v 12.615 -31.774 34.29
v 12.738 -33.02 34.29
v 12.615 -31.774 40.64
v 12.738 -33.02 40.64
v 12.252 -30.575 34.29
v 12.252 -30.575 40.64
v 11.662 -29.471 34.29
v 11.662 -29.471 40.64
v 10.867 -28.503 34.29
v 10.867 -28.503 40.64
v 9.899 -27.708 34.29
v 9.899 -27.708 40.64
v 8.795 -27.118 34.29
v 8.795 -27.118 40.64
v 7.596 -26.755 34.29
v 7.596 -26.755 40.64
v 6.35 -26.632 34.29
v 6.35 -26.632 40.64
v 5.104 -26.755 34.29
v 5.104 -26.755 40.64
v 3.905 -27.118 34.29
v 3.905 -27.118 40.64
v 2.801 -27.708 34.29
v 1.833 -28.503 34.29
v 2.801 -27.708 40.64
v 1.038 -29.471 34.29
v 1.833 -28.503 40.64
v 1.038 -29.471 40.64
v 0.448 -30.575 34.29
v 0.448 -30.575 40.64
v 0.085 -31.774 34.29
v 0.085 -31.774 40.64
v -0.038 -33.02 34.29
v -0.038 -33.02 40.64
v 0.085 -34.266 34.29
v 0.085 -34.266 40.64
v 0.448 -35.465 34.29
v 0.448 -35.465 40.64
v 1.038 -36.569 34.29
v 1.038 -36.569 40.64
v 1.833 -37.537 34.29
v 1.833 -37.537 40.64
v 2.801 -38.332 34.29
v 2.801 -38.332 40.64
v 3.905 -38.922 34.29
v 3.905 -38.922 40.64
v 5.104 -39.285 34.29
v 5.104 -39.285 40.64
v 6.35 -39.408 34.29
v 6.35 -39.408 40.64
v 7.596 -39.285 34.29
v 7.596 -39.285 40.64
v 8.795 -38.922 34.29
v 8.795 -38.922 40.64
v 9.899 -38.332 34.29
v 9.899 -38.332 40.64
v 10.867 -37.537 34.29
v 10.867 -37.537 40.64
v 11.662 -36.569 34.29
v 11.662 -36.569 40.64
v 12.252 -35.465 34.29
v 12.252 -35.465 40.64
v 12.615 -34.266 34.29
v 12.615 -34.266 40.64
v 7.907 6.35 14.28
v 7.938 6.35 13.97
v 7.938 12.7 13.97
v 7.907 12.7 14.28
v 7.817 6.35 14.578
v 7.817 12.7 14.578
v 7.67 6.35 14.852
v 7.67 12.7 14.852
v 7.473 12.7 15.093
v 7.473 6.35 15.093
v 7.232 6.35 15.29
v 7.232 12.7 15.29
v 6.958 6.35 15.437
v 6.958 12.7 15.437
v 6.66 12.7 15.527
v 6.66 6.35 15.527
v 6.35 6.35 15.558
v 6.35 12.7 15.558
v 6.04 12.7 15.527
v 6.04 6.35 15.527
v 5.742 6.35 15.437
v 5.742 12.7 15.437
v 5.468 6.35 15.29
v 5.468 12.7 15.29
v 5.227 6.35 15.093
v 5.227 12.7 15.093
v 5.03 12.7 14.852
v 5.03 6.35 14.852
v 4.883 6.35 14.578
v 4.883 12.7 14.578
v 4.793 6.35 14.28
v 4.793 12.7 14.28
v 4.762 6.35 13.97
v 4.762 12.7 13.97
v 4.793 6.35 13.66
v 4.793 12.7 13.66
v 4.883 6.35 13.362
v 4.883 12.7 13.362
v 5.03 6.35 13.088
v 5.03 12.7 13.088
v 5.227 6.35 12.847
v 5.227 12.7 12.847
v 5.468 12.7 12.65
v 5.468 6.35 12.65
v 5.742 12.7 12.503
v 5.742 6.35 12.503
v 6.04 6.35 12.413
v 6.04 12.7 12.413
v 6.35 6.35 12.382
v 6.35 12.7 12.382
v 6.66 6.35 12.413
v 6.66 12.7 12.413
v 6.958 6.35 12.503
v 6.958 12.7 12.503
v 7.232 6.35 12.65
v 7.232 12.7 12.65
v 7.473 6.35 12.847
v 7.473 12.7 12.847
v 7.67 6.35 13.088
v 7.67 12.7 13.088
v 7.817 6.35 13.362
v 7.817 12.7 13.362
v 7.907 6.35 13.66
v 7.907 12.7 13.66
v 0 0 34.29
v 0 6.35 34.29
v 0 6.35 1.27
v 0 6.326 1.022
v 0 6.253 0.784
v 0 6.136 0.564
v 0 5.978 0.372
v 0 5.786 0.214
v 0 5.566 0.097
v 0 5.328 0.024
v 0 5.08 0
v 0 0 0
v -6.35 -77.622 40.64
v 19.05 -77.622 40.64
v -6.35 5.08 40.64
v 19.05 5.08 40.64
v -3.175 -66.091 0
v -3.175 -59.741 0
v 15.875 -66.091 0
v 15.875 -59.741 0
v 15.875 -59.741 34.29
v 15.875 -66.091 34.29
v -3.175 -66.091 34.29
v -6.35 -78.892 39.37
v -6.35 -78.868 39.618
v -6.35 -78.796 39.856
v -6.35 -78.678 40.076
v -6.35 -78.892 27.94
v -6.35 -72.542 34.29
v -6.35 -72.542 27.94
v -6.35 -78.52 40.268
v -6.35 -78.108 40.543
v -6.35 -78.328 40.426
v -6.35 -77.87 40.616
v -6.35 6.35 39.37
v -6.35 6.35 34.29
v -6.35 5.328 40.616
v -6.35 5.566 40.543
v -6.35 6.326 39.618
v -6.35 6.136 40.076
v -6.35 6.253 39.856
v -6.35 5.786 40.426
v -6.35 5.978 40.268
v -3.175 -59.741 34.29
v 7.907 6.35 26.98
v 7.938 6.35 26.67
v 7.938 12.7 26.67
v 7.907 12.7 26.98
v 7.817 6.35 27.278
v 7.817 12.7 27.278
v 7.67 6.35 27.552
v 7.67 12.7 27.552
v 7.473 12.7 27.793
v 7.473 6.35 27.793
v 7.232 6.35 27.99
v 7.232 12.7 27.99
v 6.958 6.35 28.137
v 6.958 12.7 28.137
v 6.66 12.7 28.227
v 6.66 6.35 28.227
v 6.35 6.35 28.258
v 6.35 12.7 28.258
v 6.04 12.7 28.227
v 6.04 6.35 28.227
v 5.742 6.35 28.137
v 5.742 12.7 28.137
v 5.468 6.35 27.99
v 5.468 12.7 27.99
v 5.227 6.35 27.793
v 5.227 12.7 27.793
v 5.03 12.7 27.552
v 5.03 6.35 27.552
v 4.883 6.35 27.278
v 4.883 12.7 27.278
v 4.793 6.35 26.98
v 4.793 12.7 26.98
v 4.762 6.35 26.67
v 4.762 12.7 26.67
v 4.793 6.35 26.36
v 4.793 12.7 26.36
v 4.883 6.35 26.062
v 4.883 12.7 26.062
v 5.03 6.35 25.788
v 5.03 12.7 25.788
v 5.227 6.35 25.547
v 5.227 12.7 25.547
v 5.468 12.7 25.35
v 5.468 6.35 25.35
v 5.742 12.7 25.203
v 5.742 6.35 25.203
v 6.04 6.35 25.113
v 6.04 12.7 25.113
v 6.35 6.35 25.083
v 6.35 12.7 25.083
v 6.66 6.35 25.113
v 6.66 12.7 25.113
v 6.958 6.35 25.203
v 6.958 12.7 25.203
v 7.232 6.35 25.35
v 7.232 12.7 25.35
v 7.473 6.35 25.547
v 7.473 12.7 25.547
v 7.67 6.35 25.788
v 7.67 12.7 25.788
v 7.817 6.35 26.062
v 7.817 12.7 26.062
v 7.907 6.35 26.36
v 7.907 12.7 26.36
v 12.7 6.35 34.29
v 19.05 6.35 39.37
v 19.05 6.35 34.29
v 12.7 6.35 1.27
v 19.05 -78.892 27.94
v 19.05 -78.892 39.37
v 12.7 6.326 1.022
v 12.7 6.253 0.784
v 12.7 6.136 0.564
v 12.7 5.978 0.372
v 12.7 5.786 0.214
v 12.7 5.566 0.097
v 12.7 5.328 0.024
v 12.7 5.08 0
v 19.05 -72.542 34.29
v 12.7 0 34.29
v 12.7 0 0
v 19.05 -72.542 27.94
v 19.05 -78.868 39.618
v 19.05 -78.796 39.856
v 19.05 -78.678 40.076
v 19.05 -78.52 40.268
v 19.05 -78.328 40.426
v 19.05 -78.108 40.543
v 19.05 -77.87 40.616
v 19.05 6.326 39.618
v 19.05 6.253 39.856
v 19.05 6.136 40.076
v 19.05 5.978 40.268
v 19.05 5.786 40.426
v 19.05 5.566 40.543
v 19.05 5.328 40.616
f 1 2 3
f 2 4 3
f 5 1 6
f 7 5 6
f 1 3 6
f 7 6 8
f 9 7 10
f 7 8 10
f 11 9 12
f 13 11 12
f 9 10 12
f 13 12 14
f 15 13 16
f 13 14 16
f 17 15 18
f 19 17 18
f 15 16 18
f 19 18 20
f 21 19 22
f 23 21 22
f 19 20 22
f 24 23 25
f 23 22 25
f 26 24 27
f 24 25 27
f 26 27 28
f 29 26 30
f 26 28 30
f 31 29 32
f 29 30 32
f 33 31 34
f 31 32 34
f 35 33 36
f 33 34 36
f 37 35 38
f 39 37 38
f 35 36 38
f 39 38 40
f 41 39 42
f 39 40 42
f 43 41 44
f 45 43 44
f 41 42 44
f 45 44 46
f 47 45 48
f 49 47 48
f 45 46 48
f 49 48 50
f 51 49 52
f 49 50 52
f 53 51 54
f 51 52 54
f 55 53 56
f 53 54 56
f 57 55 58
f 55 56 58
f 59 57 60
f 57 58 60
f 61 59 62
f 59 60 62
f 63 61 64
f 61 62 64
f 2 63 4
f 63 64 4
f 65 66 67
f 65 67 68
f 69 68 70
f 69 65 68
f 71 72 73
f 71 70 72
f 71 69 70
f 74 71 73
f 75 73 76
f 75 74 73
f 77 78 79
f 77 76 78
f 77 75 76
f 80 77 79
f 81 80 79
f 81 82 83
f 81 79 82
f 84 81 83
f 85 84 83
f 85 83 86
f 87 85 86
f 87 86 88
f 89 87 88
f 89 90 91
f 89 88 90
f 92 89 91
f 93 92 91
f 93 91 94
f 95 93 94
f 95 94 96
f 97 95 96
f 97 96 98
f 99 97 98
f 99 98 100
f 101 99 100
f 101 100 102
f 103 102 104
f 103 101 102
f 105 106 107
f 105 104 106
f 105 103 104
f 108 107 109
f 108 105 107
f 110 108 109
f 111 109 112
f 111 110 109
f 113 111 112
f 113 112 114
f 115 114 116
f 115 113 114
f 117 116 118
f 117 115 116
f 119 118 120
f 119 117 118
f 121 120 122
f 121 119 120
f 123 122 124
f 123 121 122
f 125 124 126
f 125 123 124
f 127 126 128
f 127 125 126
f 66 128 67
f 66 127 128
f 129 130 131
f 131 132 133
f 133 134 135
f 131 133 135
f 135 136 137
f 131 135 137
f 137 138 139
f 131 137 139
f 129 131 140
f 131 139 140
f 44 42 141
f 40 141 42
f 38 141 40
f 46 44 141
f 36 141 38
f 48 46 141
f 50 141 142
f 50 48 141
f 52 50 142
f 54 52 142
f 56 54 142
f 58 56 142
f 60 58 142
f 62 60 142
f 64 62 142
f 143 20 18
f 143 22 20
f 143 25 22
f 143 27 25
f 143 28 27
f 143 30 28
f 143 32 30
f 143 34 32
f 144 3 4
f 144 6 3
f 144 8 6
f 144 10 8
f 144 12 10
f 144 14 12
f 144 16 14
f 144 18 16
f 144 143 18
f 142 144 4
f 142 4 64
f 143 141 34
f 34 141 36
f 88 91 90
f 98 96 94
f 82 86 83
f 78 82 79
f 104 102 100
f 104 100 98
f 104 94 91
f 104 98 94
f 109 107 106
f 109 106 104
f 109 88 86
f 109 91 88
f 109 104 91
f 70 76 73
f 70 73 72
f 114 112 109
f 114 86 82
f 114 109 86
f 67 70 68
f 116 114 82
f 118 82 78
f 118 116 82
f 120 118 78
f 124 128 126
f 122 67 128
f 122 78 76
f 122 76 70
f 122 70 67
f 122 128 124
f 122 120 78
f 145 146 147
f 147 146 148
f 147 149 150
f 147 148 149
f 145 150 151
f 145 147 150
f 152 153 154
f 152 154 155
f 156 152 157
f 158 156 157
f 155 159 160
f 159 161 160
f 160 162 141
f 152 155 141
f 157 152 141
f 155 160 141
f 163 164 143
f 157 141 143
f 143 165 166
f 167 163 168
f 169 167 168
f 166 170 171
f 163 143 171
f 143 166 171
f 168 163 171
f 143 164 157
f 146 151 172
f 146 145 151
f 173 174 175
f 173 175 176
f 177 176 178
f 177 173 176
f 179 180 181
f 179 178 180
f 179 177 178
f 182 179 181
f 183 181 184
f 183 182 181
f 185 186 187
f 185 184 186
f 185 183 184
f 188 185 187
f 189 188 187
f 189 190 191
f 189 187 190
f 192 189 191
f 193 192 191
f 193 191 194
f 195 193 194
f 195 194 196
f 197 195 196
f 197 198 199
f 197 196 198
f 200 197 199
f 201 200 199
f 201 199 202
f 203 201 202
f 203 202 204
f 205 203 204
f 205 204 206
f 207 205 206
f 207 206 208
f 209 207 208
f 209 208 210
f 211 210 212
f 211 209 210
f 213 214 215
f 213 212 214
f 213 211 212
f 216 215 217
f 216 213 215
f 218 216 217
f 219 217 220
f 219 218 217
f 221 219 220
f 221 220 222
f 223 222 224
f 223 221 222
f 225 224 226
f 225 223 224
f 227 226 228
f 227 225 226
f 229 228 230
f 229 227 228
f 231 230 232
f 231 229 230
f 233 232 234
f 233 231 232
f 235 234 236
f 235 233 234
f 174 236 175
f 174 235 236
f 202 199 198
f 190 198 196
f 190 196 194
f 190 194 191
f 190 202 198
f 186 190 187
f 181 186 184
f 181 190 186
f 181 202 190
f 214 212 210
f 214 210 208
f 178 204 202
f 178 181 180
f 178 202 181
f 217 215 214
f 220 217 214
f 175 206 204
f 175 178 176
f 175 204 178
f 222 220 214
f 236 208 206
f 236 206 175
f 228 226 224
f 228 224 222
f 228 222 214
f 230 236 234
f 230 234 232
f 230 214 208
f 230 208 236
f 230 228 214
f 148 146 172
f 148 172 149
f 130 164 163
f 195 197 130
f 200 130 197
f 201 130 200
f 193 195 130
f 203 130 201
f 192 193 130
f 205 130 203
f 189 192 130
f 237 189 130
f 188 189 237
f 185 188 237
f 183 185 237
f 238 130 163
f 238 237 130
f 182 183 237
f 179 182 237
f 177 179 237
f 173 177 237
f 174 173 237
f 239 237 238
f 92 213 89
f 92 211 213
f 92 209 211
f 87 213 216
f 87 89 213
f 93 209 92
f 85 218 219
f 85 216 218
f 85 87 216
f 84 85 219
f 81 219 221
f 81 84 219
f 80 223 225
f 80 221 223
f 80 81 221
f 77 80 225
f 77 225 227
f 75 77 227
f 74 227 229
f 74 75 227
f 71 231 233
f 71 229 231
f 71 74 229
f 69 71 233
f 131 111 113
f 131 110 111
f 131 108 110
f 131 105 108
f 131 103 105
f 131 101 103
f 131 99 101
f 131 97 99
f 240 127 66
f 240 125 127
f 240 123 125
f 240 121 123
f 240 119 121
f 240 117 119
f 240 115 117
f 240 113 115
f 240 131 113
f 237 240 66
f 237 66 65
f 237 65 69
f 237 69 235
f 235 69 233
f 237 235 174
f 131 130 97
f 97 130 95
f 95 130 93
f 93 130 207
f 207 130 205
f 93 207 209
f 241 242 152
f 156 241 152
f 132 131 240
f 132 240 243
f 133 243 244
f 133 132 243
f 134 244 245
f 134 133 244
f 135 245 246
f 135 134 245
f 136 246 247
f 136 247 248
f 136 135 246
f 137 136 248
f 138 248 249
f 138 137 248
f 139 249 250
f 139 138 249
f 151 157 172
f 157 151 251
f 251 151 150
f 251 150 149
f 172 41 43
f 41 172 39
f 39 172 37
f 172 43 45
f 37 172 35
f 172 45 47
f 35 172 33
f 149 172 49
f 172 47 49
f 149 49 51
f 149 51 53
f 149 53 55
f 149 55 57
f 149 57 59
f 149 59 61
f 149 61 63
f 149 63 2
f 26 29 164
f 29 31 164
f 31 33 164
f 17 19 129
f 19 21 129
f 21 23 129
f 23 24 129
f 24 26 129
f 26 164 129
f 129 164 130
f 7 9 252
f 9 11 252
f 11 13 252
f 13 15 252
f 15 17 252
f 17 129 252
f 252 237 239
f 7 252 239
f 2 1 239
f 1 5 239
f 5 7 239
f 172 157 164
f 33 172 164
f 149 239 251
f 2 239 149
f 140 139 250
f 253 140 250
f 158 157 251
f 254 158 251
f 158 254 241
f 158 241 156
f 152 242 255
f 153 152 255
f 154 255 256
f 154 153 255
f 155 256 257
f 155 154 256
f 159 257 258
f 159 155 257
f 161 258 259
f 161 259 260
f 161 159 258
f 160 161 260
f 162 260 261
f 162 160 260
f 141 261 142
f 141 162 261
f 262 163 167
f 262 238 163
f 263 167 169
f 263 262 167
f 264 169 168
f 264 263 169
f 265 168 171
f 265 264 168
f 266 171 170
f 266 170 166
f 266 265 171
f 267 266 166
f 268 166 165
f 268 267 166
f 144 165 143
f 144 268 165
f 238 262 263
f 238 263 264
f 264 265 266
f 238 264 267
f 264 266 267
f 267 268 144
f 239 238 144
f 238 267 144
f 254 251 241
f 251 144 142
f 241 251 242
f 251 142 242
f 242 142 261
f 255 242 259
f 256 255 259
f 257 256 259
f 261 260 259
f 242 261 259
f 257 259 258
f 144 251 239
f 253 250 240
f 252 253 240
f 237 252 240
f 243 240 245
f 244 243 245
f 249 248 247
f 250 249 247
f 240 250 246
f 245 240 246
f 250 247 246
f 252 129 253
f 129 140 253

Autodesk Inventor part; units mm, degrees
ref_plane "YZ Plane" through (0, 0, 0) normal (1, 0, 0) x (0, 1, 0)
ref_plane "XZ Plane" through (0, 0, 0) normal (0, 1, 0) x (-1, 0, 0)
ref_plane "XY Plane" through (0, 0, 0) normal (0, 0, 1) x (1, 0, 0)
sketch "Sketch1" plane through (0, 0, 0) normal (0, 0, 1) x (1, 0, 0)
  line L0 (0, 0) -> (12.7, 0)
  line L1 (12.7, 0) -> (12.7, 6.35)
  line L2 (12.7, 6.35) -> (0, 6.35)
  line L3 (0, 6.35) -> (0, 0)
  line L4 (-3.175, -59.7408) -> (15.875, -59.7408)
  line L5 (15.875, -59.7408) -> (15.875, -66.0908)
  line L6 (15.875, -66.0908) -> (-3.175, -66.0908)
  line L7 (-3.175, -66.0908) -> (-3.175, -59.7408)
  line L8 (-9.525, -59.7408) -> (22.225, -59.7408) construction
  line L9 (15.875, -59.7408) -> (-3.175, -66.0908) construction
  line L10 (-3.175, -59.7408) -> (15.875, -66.0908) construction
  line L11 (6.35, -62.9158) -> (15.875, -62.9158) construction
  point P0 (6.35, 6.35)
  point P1 (6.35, -59.7408)
  dimension "d0" = 12.7
  dimension "d1" = 6.35
  dimension "d2" = 6.35
  dimension "d3" = 31.75
  dimension "d4" = 69.2658
  dimension "d5" = 6.35
  dimension "d6" = 6.35
extrude "Extrusion1" add sketch "Sketch1" along normal blind 34.29
sketch "Sketch2" plane through (0, 0, 34.29) normal (0, 0, 1) x (1, 0, 0)
  line L0 (-6.35, 6.35) -> (19.05, 6.35)
  line L1 (19.05, 6.35) -> (19.05, -78.8924)
  line L2 (19.05, -78.8924) -> (-6.35, -78.8924)
  line L3 (-6.35, -78.8924) -> (-6.35, 6.35)
  line L4 (0, 0) -> (12.7, 0) projected
  line L5 (12.7, 0) -> (12.7, 6.35) projected
  line L6 (12.7, 6.35) -> (0, 6.35) projected
  line L7 (0, 6.35) -> (0, 0) projected
  point P0 (6.35, 6.35)
  point P1 (6.35, 6.35)
  dimension "d9" = 25.4
  dimension "d10" = 85.2424
extrude "Extrusion2" add sketch "Sketch2" along normal blind 6.35
sketch "Sketch3" plane through (0, 0, 34.29) normal (0, 0, -1) x (-1, 0, 0)
  line L0 (-15.875, -66.0908) -> (-15.875, -59.7408) projected
  line L1 (-15.875, -59.7408) -> (3.175, -59.7408) projected
  line L2 (3.175, -59.7408) -> (3.175, -66.0908) projected
  line L3 (3.175, -66.0908) -> (-15.875, -66.0908) projected
  line L4 (-12.7, 0) -> (-12.7, 6.35) projected
  line L5 (-12.7, 6.35) -> (-19.05, 6.35) projected
  line L6 (-19.05, 6.35) -> (-19.05, -78.8924) projected
  line L7 (-19.05, -78.8924) -> (6.35, -78.8924) projected
  line L8 (6.35, -78.8924) -> (6.35, 6.35) projected
  line L9 (6.35, 6.35) -> (0, 6.35) projected
  line L10 (0, 6.35) -> (0, 0) projected
  line L11 (0, 0) -> (-12.7, 0) projected
  line L12 (6.35, 6.35) -> (6.35, -78.8924) projected
  line L13 (-19.05, -78.8924) -> (6.35, -78.8924)
  line L14 (6.35, -78.8924) -> (6.35, -72.5424)
  line L15 (6.35, -72.5424) -> (-19.05, -72.5424)
  line L16 (-19.05, -72.5424) -> (-19.05, -78.8924)
  dimension "d13" = 6.35
extrude "Extrusion3" add sketch "Sketch3" along normal blind 6.35 contours L15 L8 L7 L6
sketch "Sketch4" plane through (0, 6.35, 0) normal (0, 1, 0) x (1, 0, 0)
  line L0 (12.7, 0) -> (0, 0) projected
  line L1 (0, 0) -> (0, -34.29) projected
  line L2 (-6.35, -34.29) -> (0, -34.29) projected
  line L3 (-6.35, -34.29) -> (-6.35, -40.64) projected
  line L4 (19.05, -40.64) -> (-6.35, -40.64) projected
  line L5 (19.05, -34.29) -> (19.05, -40.64) projected
  line L6 (12.7, -34.29) -> (19.05, -34.29) projected
  line L7 (12.7, 0) -> (12.7, -34.29) projected
  line L8 (15.875, 0) -> (-3.175, 0) construction
  line L9 (6.35, 0) -> (6.35, -40.64) construction
  line L10 (-6.35, -40.64) -> (19.05, -40.64) construction
  line L11 (0, -34.29) -> (0, -40.64) construction
  line L12 (12.7, -34.29) -> (12.7, -40.64) construction
  line L13 (12.7, -40.64) -> (0, 0) construction
  line L14 (0, -40.64) -> (12.7, 0) construction
  circle A0 centre (6.35, -26.67) radius 1.5875
  circle A1 centre (6.35, -13.97) radius 1.5875
  line L15 (6.35, -20.32) -> (0, -20.32) construction
  point P0 (0, 0)
  dimension "d16" = 3.175
  dimension "d17" = 6.35
  dimension "d18" = 6.35
extrude "Extrusion4" add sketch "Sketch4" along normal blind 6.35 contours A0 | A1
sketch "Sketch5" plane through (0, 0, 40.64) normal (0, 0, 1) x (1, 0, 0)
  line L0 (19.05, 6.35) -> (-6.35, 6.35) projected
  line L1 (-6.35, 6.35) -> (-6.35, -78.8924) projected
  line L2 (-6.35, -78.8924) -> (19.05, -78.8924) projected
  line L3 (19.05, -78.8924) -> (19.05, 6.35) projected
  circle A0 centre (6.35, -33.02) radius 6.3881
  point P0 (0, 0)
  point P1 (6.35, 6.35)
  dimension "d21" = 12.7762
  dimension "d22" = 39.37
extrude "Extrusion5" cut sketch "Sketch5" against normal up to surface (6.35 mm away) contours A0
fillet "Fillet2" radius 1.27 3 edges at (6.35, 6.35, 40.64) (6.35, -78.8924, 40.64) (6.35, 6.35, 0)
equation "\"d6\" = d5"
equation "\"d18\" = d17"
properties part number "Spool Holder Cap Section Mk1"
